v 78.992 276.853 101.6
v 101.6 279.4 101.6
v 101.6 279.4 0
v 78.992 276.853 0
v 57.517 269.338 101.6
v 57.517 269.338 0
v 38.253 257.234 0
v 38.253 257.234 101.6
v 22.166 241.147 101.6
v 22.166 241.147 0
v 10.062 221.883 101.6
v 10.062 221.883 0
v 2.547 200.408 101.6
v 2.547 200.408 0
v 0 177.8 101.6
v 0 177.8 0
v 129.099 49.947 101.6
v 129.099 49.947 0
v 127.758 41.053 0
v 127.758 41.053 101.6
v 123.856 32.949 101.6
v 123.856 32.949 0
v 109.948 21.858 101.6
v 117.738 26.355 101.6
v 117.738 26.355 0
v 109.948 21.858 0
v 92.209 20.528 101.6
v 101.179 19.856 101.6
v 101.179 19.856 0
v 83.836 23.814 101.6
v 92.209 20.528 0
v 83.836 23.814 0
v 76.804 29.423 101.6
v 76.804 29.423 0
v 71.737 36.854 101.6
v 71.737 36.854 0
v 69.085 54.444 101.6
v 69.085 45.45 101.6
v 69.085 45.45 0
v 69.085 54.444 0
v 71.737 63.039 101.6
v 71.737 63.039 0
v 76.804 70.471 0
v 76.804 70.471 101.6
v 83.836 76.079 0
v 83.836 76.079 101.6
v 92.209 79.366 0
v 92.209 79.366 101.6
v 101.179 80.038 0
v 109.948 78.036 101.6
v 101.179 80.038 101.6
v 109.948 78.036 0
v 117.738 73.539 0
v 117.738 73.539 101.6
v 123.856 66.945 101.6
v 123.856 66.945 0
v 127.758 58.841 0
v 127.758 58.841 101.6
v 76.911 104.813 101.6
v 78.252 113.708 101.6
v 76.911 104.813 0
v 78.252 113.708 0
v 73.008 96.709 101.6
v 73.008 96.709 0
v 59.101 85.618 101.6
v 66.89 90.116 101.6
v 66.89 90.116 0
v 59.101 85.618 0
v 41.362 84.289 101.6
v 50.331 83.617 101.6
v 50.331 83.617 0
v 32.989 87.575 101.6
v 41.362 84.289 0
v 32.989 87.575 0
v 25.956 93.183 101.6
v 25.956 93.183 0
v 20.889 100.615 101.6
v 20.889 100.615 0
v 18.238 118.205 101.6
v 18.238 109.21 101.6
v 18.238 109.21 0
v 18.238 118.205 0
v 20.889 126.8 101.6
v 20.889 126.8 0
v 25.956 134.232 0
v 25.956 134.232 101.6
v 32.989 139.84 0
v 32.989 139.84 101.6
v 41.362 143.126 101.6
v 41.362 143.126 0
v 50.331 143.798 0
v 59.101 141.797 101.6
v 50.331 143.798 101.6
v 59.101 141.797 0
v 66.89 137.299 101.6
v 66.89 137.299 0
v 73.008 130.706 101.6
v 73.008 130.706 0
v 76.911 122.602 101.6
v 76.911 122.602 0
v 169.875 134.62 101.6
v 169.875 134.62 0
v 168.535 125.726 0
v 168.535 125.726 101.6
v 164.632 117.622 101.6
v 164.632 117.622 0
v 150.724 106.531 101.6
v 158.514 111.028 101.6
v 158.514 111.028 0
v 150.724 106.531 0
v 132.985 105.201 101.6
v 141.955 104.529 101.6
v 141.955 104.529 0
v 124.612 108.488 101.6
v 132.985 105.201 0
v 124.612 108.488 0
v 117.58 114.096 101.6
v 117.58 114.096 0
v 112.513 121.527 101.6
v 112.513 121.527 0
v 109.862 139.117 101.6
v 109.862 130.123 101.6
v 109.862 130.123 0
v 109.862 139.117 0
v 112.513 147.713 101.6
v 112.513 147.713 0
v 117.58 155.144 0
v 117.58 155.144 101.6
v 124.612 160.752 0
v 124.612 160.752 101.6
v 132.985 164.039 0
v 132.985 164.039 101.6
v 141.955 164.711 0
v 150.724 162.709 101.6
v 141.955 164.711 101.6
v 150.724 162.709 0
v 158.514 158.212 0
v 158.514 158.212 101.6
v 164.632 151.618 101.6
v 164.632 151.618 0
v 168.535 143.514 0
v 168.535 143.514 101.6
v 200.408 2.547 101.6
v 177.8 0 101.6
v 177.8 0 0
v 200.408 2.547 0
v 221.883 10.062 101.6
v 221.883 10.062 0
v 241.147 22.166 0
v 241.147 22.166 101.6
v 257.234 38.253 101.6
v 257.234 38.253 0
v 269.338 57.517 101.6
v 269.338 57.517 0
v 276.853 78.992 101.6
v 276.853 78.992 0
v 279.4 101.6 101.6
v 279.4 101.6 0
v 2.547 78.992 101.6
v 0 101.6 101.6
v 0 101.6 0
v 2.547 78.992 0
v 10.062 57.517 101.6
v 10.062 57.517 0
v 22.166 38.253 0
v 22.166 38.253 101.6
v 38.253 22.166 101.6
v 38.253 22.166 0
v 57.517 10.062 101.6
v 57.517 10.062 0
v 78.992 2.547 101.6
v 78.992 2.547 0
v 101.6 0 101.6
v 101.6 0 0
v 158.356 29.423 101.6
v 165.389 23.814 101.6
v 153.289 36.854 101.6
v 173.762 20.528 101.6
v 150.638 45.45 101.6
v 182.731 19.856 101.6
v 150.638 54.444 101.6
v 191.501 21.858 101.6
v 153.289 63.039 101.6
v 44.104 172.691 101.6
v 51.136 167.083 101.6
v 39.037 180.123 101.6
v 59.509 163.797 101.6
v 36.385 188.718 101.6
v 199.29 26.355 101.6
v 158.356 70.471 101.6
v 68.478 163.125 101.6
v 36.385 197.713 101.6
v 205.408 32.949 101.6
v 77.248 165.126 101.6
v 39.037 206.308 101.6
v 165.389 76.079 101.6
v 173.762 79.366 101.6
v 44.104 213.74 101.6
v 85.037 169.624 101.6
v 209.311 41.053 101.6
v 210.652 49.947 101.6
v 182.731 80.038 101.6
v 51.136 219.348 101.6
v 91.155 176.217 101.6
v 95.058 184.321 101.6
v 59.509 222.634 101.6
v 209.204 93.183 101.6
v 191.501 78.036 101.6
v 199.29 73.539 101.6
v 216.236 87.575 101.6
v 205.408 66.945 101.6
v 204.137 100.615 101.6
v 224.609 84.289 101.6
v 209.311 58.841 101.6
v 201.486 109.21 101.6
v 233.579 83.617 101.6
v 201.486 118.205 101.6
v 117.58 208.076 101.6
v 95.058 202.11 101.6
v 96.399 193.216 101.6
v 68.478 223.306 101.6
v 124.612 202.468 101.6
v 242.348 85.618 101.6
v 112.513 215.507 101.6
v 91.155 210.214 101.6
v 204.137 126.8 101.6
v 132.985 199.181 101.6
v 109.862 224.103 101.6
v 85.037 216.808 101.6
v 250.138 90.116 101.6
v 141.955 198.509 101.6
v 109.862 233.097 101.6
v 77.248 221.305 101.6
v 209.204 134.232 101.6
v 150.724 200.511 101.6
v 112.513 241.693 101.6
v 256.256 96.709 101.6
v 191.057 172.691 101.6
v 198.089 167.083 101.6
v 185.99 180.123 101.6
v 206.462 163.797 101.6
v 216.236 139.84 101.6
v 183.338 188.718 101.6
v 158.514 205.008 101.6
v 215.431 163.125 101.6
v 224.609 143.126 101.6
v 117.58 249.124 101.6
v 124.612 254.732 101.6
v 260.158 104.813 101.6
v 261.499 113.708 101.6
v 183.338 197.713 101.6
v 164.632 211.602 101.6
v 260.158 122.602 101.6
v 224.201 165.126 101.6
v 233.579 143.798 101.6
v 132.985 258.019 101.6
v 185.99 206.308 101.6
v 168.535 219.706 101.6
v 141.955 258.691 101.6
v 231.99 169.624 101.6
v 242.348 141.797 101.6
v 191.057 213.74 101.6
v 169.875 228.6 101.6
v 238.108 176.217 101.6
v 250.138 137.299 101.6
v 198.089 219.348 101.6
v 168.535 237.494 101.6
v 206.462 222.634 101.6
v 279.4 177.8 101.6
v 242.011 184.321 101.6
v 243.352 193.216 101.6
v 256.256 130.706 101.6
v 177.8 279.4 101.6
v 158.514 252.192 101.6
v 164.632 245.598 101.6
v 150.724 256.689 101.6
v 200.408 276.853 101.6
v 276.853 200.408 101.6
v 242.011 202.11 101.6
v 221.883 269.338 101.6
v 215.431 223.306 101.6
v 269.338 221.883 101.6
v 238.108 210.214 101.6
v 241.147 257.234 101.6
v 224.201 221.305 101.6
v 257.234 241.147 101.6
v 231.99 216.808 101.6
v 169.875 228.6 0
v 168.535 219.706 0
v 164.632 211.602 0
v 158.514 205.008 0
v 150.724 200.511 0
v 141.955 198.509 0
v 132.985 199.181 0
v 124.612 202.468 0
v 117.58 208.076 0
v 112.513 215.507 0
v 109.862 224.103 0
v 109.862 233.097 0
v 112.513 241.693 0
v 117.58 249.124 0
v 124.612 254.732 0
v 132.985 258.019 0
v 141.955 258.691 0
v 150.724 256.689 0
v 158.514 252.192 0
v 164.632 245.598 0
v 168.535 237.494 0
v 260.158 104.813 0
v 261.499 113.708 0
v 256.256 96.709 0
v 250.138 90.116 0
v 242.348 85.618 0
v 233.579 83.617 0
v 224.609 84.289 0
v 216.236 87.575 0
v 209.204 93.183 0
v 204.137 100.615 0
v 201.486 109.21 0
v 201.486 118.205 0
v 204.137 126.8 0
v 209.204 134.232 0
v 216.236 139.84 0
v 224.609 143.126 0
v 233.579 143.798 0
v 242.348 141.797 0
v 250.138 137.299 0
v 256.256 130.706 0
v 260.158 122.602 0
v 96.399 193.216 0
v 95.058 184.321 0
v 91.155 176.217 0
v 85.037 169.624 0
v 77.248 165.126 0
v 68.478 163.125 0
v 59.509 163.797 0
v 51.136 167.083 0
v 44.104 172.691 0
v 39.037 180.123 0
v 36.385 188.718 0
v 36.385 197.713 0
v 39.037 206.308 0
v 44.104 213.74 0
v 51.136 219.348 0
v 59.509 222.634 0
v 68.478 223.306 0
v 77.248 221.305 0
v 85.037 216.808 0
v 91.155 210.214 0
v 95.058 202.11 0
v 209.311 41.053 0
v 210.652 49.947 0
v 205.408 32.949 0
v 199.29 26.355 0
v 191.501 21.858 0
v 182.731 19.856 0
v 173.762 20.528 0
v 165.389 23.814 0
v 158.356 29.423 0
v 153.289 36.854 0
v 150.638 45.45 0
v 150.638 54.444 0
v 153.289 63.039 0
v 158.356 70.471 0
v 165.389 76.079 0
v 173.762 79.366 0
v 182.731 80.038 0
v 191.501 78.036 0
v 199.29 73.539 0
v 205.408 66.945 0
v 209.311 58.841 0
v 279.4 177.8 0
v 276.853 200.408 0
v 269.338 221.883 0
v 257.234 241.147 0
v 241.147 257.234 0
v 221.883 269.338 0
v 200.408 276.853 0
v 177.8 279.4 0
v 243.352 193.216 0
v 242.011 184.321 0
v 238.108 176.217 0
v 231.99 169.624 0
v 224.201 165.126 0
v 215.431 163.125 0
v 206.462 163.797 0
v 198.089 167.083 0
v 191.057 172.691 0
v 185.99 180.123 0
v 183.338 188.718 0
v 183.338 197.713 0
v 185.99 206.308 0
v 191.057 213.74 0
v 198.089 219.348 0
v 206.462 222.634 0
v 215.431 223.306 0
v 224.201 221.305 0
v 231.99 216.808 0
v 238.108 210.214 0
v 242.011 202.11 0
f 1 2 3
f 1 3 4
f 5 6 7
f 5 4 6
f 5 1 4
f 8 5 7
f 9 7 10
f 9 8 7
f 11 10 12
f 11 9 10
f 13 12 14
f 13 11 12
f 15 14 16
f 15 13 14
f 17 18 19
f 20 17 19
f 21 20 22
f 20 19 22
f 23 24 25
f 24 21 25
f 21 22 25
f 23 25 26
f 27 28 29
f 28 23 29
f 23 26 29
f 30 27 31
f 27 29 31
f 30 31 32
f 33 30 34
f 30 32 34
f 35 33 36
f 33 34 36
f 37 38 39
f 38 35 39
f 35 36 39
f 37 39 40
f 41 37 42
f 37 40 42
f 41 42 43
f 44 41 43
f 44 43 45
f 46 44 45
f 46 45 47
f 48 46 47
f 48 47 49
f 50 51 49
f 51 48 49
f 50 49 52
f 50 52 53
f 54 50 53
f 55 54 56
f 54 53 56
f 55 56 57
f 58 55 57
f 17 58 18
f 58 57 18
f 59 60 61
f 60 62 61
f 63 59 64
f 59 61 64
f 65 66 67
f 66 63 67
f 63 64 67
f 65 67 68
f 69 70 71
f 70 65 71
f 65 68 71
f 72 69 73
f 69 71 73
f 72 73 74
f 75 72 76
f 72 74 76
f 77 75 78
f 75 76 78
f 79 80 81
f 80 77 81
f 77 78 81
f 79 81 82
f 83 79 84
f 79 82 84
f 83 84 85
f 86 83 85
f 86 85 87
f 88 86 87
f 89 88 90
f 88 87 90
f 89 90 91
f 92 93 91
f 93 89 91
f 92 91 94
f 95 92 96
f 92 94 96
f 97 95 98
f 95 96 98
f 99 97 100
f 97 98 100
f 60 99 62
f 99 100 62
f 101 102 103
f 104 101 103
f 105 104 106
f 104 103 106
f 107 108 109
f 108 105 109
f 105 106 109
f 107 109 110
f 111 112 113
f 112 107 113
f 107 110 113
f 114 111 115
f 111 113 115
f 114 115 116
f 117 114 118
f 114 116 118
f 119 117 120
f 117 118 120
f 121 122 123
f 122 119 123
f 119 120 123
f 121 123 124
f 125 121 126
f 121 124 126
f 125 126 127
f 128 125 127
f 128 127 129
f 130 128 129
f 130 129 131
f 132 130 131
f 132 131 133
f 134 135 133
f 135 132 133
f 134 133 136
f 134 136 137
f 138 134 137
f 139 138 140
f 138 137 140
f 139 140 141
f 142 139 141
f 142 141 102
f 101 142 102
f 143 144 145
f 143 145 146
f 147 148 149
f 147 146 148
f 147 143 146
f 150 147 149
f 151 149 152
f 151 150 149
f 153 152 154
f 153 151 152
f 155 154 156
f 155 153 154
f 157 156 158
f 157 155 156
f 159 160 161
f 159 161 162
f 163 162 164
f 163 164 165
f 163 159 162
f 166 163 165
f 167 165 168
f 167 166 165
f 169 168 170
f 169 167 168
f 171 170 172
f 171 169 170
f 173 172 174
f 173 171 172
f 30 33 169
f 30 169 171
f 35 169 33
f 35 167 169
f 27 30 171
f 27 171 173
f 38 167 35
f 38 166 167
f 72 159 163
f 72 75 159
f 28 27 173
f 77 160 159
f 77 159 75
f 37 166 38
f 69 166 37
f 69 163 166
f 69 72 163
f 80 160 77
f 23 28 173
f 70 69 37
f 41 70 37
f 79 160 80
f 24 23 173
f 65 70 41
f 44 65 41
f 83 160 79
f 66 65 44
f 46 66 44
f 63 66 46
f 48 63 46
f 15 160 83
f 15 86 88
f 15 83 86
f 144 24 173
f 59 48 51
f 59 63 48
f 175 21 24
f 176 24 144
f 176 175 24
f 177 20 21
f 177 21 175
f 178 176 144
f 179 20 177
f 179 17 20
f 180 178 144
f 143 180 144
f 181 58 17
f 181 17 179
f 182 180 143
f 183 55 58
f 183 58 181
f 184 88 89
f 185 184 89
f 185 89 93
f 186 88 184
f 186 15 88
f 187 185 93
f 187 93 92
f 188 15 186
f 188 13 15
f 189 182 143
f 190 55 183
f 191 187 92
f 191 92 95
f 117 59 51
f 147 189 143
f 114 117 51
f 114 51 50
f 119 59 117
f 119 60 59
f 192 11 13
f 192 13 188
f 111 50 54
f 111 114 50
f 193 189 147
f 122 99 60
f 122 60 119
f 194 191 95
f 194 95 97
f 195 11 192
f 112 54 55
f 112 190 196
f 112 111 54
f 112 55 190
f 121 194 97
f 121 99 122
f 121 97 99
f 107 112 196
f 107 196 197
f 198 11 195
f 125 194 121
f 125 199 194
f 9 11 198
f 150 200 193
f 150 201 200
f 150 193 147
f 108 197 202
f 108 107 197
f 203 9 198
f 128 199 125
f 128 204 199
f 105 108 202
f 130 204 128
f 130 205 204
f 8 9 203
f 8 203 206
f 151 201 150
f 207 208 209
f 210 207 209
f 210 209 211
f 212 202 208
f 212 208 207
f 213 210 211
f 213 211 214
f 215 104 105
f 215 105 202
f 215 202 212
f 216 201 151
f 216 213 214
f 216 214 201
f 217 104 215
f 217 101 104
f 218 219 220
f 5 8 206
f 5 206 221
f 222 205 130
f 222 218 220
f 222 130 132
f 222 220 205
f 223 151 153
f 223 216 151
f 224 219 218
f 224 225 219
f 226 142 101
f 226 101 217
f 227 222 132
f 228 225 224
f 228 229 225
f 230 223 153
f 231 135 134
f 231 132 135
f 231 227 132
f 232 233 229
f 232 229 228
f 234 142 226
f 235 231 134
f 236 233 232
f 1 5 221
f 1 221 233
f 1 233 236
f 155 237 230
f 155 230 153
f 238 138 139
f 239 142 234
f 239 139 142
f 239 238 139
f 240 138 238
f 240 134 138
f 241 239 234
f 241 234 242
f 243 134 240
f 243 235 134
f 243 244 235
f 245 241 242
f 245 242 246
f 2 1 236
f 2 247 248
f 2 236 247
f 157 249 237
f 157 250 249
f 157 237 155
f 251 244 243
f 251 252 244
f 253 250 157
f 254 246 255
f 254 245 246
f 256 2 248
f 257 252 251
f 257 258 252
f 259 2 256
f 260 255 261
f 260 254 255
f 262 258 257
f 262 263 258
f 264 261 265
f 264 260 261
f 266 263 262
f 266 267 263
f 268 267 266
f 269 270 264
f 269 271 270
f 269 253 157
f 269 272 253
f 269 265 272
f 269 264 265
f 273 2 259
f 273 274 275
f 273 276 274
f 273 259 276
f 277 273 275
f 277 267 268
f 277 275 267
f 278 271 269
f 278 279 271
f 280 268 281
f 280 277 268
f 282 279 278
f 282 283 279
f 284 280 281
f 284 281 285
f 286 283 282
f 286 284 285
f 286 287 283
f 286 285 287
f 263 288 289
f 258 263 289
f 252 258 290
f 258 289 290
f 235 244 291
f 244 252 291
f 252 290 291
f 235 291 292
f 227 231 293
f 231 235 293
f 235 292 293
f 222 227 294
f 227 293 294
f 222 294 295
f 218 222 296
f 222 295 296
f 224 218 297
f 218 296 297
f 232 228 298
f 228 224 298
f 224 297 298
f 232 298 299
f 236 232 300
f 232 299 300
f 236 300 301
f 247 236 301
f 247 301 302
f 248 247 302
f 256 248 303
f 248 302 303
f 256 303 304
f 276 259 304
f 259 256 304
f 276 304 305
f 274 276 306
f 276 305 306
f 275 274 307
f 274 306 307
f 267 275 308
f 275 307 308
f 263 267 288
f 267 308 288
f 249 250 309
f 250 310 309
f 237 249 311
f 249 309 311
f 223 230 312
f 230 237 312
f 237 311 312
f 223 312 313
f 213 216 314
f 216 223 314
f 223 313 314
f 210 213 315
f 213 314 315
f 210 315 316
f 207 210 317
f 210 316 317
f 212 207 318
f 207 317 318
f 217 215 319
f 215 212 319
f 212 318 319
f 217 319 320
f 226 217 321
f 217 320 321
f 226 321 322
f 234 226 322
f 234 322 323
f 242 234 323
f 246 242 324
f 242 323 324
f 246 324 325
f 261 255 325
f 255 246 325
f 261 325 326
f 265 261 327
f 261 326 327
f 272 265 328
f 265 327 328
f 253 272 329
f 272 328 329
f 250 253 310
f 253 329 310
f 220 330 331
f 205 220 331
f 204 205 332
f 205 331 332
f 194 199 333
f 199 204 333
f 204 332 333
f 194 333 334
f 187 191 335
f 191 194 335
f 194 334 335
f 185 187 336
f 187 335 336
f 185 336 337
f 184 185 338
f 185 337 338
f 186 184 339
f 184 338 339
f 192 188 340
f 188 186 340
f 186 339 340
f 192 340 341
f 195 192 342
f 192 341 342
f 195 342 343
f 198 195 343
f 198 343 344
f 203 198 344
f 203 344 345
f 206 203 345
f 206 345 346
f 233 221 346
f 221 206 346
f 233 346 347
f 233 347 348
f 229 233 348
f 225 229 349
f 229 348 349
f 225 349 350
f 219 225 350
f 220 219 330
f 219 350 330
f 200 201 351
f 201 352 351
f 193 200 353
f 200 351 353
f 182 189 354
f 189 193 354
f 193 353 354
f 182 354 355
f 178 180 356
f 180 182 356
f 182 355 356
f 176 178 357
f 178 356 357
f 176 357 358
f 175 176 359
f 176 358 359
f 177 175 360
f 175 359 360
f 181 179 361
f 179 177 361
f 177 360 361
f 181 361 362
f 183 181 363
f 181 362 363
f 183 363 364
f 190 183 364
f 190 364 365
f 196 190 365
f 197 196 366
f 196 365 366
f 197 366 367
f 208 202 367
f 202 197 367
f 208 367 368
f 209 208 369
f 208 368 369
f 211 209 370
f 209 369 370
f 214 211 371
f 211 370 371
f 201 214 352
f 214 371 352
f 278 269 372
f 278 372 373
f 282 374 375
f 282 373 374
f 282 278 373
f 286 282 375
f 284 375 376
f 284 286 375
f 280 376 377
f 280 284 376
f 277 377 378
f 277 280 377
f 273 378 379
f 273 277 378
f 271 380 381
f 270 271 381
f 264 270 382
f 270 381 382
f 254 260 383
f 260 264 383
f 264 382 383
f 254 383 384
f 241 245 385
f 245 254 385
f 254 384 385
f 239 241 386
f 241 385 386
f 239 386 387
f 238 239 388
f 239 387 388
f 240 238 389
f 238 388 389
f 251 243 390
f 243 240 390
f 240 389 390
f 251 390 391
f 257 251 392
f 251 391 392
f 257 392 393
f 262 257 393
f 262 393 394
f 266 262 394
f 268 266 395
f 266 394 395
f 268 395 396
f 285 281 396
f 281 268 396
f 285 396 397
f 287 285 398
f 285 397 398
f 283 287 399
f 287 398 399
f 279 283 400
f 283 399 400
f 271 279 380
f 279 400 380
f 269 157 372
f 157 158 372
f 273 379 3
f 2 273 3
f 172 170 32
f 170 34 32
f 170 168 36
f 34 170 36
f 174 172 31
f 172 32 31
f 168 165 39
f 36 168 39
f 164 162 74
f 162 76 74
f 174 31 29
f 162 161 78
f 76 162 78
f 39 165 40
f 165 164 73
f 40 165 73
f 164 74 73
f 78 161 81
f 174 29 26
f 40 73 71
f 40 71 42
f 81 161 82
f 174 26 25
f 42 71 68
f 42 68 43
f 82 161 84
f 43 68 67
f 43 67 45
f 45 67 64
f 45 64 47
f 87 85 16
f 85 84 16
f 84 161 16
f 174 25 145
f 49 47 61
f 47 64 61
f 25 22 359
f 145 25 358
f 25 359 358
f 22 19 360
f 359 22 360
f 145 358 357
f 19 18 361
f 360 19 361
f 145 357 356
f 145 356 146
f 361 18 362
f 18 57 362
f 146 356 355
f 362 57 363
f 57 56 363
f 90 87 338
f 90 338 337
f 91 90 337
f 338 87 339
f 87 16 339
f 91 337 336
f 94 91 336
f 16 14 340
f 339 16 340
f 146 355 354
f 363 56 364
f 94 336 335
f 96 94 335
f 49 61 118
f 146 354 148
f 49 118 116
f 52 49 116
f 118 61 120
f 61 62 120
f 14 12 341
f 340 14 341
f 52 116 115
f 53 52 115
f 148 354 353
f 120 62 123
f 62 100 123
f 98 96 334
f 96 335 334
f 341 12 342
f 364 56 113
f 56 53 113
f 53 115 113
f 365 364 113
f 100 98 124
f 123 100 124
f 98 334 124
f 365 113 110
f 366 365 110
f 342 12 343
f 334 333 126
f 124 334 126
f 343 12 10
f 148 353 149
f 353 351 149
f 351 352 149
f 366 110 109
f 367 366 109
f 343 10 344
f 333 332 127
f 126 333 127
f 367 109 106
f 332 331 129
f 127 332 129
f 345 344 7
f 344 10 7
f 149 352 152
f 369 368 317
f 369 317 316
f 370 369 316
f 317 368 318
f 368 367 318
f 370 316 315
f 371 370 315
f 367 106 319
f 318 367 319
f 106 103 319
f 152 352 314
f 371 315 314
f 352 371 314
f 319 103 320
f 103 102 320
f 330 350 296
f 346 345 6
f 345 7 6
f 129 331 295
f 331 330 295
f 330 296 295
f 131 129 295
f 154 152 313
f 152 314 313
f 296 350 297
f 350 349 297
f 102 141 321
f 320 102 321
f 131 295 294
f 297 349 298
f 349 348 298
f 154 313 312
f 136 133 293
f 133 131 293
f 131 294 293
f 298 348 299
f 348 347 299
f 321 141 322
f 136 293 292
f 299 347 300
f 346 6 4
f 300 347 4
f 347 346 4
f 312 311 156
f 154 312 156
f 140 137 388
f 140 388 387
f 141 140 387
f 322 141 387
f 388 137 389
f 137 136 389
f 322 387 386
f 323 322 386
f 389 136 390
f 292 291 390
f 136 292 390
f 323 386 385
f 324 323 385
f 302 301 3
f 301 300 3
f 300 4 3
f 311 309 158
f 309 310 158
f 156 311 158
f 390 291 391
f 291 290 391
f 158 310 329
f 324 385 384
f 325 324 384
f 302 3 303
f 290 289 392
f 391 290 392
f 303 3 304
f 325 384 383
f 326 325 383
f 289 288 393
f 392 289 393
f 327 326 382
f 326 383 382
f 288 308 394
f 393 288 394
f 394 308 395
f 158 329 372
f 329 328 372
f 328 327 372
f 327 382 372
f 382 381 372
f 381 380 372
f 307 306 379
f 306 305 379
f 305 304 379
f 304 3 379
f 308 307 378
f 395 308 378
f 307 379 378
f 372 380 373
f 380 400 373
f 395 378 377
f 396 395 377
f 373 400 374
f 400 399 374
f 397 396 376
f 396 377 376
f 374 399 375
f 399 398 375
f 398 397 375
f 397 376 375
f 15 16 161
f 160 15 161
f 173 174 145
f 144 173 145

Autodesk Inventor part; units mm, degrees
ref_plane "YZ Plane" through (0, 0, 0) normal (1, 0, 0) x (0, 1, 0)
sketch "Sketch1" plane through (0, 0, 0) normal (0, 0, 1) x (1, 0, 0)
  line L0 (0, 0) -> (279.4, 0)
  line L1 (279.4, 0) -> (279.4, 279.4)
  line L2 (279.4, 279.4) -> (0, 279.4)
  line L3 (0, 279.4) -> (0, 0)
  circle A0 centre (139.7, 134.62) radius 30.1752
  circle A1 centre (139.7, 228.6) radius 30.1752
  circle A2 centre (66.2235, 193.2156) radius 30.1752
  circle A3 centre (48.0763, 113.7075) radius 30.1752
  circle A4 centre (98.9236, 49.9469) radius 30.1752
  circle A5 centre (180.4764, 49.9469) radius 30.1752
  circle A6 centre (231.3237, 113.7075) radius 30.1752
  circle A7 centre (213.1765, 193.2156) radius 30.1752
  dimension "d0" = 279.4
  dimension "d1" = 279.4
  dimension "d2" = 60.3504
  dimension "d3" = 60.3504
  dimension "d22" = 360
extrude "Extrusion1" add sketch "Sketch1" along normal blind 101.6
fillet "Fillet1" radius 101.6 4 edges at (279.4, 279.4, 50.8) (0, 279.4, 50.8) (279.4, 0, 50.8) (0, 0, 50.8)
ref_plane "Work Plane1" through (139.7, 101.6, 0) normal (1, 0, 0) x (0, 0, -1)
ref_plane "Work Plane2" through (0, 0, 50.8) normal (0, 0, 1) x (1, 0, 0)
sketch "Sketch2" plane through (279.4, 101.6, 0) normal (1, 0, 0) x (0, 0, -1)
  line L0 (0, 0) -> (-101.6, 0) projected
  line L1 (0, 0) -> (0, 76.2) projected
  line L2 (-101.6, 76.2) -> (0, 76.2) projected
  line L3 (-101.6, 0) -> (-101.6, 76.2) projected
  circle A0 centre (-50.8, 38.1) radius 12.7
  point P0 (0, -101.6)
  dimension "d14" = 25.4
sketch "Sketch3" plane through (0, 101.6, 0) normal (-1, 0, 0) x (0, 0, 1)
  line L0 (101.6, 0) -> (0, 0) projected
  line L1 (101.6, 76.2) -> (101.6, 0) projected
  line L2 (0, 76.2) -> (101.6, 76.2) projected
  line L3 (0, 76.2) -> (0, 0) projected
  circle A0 centre (50.8, 38.1) radius 12.7
  point P0 (0, -101.6)
  dimension "d15" = 25.4
properties part number "ShooterMount-1in"
